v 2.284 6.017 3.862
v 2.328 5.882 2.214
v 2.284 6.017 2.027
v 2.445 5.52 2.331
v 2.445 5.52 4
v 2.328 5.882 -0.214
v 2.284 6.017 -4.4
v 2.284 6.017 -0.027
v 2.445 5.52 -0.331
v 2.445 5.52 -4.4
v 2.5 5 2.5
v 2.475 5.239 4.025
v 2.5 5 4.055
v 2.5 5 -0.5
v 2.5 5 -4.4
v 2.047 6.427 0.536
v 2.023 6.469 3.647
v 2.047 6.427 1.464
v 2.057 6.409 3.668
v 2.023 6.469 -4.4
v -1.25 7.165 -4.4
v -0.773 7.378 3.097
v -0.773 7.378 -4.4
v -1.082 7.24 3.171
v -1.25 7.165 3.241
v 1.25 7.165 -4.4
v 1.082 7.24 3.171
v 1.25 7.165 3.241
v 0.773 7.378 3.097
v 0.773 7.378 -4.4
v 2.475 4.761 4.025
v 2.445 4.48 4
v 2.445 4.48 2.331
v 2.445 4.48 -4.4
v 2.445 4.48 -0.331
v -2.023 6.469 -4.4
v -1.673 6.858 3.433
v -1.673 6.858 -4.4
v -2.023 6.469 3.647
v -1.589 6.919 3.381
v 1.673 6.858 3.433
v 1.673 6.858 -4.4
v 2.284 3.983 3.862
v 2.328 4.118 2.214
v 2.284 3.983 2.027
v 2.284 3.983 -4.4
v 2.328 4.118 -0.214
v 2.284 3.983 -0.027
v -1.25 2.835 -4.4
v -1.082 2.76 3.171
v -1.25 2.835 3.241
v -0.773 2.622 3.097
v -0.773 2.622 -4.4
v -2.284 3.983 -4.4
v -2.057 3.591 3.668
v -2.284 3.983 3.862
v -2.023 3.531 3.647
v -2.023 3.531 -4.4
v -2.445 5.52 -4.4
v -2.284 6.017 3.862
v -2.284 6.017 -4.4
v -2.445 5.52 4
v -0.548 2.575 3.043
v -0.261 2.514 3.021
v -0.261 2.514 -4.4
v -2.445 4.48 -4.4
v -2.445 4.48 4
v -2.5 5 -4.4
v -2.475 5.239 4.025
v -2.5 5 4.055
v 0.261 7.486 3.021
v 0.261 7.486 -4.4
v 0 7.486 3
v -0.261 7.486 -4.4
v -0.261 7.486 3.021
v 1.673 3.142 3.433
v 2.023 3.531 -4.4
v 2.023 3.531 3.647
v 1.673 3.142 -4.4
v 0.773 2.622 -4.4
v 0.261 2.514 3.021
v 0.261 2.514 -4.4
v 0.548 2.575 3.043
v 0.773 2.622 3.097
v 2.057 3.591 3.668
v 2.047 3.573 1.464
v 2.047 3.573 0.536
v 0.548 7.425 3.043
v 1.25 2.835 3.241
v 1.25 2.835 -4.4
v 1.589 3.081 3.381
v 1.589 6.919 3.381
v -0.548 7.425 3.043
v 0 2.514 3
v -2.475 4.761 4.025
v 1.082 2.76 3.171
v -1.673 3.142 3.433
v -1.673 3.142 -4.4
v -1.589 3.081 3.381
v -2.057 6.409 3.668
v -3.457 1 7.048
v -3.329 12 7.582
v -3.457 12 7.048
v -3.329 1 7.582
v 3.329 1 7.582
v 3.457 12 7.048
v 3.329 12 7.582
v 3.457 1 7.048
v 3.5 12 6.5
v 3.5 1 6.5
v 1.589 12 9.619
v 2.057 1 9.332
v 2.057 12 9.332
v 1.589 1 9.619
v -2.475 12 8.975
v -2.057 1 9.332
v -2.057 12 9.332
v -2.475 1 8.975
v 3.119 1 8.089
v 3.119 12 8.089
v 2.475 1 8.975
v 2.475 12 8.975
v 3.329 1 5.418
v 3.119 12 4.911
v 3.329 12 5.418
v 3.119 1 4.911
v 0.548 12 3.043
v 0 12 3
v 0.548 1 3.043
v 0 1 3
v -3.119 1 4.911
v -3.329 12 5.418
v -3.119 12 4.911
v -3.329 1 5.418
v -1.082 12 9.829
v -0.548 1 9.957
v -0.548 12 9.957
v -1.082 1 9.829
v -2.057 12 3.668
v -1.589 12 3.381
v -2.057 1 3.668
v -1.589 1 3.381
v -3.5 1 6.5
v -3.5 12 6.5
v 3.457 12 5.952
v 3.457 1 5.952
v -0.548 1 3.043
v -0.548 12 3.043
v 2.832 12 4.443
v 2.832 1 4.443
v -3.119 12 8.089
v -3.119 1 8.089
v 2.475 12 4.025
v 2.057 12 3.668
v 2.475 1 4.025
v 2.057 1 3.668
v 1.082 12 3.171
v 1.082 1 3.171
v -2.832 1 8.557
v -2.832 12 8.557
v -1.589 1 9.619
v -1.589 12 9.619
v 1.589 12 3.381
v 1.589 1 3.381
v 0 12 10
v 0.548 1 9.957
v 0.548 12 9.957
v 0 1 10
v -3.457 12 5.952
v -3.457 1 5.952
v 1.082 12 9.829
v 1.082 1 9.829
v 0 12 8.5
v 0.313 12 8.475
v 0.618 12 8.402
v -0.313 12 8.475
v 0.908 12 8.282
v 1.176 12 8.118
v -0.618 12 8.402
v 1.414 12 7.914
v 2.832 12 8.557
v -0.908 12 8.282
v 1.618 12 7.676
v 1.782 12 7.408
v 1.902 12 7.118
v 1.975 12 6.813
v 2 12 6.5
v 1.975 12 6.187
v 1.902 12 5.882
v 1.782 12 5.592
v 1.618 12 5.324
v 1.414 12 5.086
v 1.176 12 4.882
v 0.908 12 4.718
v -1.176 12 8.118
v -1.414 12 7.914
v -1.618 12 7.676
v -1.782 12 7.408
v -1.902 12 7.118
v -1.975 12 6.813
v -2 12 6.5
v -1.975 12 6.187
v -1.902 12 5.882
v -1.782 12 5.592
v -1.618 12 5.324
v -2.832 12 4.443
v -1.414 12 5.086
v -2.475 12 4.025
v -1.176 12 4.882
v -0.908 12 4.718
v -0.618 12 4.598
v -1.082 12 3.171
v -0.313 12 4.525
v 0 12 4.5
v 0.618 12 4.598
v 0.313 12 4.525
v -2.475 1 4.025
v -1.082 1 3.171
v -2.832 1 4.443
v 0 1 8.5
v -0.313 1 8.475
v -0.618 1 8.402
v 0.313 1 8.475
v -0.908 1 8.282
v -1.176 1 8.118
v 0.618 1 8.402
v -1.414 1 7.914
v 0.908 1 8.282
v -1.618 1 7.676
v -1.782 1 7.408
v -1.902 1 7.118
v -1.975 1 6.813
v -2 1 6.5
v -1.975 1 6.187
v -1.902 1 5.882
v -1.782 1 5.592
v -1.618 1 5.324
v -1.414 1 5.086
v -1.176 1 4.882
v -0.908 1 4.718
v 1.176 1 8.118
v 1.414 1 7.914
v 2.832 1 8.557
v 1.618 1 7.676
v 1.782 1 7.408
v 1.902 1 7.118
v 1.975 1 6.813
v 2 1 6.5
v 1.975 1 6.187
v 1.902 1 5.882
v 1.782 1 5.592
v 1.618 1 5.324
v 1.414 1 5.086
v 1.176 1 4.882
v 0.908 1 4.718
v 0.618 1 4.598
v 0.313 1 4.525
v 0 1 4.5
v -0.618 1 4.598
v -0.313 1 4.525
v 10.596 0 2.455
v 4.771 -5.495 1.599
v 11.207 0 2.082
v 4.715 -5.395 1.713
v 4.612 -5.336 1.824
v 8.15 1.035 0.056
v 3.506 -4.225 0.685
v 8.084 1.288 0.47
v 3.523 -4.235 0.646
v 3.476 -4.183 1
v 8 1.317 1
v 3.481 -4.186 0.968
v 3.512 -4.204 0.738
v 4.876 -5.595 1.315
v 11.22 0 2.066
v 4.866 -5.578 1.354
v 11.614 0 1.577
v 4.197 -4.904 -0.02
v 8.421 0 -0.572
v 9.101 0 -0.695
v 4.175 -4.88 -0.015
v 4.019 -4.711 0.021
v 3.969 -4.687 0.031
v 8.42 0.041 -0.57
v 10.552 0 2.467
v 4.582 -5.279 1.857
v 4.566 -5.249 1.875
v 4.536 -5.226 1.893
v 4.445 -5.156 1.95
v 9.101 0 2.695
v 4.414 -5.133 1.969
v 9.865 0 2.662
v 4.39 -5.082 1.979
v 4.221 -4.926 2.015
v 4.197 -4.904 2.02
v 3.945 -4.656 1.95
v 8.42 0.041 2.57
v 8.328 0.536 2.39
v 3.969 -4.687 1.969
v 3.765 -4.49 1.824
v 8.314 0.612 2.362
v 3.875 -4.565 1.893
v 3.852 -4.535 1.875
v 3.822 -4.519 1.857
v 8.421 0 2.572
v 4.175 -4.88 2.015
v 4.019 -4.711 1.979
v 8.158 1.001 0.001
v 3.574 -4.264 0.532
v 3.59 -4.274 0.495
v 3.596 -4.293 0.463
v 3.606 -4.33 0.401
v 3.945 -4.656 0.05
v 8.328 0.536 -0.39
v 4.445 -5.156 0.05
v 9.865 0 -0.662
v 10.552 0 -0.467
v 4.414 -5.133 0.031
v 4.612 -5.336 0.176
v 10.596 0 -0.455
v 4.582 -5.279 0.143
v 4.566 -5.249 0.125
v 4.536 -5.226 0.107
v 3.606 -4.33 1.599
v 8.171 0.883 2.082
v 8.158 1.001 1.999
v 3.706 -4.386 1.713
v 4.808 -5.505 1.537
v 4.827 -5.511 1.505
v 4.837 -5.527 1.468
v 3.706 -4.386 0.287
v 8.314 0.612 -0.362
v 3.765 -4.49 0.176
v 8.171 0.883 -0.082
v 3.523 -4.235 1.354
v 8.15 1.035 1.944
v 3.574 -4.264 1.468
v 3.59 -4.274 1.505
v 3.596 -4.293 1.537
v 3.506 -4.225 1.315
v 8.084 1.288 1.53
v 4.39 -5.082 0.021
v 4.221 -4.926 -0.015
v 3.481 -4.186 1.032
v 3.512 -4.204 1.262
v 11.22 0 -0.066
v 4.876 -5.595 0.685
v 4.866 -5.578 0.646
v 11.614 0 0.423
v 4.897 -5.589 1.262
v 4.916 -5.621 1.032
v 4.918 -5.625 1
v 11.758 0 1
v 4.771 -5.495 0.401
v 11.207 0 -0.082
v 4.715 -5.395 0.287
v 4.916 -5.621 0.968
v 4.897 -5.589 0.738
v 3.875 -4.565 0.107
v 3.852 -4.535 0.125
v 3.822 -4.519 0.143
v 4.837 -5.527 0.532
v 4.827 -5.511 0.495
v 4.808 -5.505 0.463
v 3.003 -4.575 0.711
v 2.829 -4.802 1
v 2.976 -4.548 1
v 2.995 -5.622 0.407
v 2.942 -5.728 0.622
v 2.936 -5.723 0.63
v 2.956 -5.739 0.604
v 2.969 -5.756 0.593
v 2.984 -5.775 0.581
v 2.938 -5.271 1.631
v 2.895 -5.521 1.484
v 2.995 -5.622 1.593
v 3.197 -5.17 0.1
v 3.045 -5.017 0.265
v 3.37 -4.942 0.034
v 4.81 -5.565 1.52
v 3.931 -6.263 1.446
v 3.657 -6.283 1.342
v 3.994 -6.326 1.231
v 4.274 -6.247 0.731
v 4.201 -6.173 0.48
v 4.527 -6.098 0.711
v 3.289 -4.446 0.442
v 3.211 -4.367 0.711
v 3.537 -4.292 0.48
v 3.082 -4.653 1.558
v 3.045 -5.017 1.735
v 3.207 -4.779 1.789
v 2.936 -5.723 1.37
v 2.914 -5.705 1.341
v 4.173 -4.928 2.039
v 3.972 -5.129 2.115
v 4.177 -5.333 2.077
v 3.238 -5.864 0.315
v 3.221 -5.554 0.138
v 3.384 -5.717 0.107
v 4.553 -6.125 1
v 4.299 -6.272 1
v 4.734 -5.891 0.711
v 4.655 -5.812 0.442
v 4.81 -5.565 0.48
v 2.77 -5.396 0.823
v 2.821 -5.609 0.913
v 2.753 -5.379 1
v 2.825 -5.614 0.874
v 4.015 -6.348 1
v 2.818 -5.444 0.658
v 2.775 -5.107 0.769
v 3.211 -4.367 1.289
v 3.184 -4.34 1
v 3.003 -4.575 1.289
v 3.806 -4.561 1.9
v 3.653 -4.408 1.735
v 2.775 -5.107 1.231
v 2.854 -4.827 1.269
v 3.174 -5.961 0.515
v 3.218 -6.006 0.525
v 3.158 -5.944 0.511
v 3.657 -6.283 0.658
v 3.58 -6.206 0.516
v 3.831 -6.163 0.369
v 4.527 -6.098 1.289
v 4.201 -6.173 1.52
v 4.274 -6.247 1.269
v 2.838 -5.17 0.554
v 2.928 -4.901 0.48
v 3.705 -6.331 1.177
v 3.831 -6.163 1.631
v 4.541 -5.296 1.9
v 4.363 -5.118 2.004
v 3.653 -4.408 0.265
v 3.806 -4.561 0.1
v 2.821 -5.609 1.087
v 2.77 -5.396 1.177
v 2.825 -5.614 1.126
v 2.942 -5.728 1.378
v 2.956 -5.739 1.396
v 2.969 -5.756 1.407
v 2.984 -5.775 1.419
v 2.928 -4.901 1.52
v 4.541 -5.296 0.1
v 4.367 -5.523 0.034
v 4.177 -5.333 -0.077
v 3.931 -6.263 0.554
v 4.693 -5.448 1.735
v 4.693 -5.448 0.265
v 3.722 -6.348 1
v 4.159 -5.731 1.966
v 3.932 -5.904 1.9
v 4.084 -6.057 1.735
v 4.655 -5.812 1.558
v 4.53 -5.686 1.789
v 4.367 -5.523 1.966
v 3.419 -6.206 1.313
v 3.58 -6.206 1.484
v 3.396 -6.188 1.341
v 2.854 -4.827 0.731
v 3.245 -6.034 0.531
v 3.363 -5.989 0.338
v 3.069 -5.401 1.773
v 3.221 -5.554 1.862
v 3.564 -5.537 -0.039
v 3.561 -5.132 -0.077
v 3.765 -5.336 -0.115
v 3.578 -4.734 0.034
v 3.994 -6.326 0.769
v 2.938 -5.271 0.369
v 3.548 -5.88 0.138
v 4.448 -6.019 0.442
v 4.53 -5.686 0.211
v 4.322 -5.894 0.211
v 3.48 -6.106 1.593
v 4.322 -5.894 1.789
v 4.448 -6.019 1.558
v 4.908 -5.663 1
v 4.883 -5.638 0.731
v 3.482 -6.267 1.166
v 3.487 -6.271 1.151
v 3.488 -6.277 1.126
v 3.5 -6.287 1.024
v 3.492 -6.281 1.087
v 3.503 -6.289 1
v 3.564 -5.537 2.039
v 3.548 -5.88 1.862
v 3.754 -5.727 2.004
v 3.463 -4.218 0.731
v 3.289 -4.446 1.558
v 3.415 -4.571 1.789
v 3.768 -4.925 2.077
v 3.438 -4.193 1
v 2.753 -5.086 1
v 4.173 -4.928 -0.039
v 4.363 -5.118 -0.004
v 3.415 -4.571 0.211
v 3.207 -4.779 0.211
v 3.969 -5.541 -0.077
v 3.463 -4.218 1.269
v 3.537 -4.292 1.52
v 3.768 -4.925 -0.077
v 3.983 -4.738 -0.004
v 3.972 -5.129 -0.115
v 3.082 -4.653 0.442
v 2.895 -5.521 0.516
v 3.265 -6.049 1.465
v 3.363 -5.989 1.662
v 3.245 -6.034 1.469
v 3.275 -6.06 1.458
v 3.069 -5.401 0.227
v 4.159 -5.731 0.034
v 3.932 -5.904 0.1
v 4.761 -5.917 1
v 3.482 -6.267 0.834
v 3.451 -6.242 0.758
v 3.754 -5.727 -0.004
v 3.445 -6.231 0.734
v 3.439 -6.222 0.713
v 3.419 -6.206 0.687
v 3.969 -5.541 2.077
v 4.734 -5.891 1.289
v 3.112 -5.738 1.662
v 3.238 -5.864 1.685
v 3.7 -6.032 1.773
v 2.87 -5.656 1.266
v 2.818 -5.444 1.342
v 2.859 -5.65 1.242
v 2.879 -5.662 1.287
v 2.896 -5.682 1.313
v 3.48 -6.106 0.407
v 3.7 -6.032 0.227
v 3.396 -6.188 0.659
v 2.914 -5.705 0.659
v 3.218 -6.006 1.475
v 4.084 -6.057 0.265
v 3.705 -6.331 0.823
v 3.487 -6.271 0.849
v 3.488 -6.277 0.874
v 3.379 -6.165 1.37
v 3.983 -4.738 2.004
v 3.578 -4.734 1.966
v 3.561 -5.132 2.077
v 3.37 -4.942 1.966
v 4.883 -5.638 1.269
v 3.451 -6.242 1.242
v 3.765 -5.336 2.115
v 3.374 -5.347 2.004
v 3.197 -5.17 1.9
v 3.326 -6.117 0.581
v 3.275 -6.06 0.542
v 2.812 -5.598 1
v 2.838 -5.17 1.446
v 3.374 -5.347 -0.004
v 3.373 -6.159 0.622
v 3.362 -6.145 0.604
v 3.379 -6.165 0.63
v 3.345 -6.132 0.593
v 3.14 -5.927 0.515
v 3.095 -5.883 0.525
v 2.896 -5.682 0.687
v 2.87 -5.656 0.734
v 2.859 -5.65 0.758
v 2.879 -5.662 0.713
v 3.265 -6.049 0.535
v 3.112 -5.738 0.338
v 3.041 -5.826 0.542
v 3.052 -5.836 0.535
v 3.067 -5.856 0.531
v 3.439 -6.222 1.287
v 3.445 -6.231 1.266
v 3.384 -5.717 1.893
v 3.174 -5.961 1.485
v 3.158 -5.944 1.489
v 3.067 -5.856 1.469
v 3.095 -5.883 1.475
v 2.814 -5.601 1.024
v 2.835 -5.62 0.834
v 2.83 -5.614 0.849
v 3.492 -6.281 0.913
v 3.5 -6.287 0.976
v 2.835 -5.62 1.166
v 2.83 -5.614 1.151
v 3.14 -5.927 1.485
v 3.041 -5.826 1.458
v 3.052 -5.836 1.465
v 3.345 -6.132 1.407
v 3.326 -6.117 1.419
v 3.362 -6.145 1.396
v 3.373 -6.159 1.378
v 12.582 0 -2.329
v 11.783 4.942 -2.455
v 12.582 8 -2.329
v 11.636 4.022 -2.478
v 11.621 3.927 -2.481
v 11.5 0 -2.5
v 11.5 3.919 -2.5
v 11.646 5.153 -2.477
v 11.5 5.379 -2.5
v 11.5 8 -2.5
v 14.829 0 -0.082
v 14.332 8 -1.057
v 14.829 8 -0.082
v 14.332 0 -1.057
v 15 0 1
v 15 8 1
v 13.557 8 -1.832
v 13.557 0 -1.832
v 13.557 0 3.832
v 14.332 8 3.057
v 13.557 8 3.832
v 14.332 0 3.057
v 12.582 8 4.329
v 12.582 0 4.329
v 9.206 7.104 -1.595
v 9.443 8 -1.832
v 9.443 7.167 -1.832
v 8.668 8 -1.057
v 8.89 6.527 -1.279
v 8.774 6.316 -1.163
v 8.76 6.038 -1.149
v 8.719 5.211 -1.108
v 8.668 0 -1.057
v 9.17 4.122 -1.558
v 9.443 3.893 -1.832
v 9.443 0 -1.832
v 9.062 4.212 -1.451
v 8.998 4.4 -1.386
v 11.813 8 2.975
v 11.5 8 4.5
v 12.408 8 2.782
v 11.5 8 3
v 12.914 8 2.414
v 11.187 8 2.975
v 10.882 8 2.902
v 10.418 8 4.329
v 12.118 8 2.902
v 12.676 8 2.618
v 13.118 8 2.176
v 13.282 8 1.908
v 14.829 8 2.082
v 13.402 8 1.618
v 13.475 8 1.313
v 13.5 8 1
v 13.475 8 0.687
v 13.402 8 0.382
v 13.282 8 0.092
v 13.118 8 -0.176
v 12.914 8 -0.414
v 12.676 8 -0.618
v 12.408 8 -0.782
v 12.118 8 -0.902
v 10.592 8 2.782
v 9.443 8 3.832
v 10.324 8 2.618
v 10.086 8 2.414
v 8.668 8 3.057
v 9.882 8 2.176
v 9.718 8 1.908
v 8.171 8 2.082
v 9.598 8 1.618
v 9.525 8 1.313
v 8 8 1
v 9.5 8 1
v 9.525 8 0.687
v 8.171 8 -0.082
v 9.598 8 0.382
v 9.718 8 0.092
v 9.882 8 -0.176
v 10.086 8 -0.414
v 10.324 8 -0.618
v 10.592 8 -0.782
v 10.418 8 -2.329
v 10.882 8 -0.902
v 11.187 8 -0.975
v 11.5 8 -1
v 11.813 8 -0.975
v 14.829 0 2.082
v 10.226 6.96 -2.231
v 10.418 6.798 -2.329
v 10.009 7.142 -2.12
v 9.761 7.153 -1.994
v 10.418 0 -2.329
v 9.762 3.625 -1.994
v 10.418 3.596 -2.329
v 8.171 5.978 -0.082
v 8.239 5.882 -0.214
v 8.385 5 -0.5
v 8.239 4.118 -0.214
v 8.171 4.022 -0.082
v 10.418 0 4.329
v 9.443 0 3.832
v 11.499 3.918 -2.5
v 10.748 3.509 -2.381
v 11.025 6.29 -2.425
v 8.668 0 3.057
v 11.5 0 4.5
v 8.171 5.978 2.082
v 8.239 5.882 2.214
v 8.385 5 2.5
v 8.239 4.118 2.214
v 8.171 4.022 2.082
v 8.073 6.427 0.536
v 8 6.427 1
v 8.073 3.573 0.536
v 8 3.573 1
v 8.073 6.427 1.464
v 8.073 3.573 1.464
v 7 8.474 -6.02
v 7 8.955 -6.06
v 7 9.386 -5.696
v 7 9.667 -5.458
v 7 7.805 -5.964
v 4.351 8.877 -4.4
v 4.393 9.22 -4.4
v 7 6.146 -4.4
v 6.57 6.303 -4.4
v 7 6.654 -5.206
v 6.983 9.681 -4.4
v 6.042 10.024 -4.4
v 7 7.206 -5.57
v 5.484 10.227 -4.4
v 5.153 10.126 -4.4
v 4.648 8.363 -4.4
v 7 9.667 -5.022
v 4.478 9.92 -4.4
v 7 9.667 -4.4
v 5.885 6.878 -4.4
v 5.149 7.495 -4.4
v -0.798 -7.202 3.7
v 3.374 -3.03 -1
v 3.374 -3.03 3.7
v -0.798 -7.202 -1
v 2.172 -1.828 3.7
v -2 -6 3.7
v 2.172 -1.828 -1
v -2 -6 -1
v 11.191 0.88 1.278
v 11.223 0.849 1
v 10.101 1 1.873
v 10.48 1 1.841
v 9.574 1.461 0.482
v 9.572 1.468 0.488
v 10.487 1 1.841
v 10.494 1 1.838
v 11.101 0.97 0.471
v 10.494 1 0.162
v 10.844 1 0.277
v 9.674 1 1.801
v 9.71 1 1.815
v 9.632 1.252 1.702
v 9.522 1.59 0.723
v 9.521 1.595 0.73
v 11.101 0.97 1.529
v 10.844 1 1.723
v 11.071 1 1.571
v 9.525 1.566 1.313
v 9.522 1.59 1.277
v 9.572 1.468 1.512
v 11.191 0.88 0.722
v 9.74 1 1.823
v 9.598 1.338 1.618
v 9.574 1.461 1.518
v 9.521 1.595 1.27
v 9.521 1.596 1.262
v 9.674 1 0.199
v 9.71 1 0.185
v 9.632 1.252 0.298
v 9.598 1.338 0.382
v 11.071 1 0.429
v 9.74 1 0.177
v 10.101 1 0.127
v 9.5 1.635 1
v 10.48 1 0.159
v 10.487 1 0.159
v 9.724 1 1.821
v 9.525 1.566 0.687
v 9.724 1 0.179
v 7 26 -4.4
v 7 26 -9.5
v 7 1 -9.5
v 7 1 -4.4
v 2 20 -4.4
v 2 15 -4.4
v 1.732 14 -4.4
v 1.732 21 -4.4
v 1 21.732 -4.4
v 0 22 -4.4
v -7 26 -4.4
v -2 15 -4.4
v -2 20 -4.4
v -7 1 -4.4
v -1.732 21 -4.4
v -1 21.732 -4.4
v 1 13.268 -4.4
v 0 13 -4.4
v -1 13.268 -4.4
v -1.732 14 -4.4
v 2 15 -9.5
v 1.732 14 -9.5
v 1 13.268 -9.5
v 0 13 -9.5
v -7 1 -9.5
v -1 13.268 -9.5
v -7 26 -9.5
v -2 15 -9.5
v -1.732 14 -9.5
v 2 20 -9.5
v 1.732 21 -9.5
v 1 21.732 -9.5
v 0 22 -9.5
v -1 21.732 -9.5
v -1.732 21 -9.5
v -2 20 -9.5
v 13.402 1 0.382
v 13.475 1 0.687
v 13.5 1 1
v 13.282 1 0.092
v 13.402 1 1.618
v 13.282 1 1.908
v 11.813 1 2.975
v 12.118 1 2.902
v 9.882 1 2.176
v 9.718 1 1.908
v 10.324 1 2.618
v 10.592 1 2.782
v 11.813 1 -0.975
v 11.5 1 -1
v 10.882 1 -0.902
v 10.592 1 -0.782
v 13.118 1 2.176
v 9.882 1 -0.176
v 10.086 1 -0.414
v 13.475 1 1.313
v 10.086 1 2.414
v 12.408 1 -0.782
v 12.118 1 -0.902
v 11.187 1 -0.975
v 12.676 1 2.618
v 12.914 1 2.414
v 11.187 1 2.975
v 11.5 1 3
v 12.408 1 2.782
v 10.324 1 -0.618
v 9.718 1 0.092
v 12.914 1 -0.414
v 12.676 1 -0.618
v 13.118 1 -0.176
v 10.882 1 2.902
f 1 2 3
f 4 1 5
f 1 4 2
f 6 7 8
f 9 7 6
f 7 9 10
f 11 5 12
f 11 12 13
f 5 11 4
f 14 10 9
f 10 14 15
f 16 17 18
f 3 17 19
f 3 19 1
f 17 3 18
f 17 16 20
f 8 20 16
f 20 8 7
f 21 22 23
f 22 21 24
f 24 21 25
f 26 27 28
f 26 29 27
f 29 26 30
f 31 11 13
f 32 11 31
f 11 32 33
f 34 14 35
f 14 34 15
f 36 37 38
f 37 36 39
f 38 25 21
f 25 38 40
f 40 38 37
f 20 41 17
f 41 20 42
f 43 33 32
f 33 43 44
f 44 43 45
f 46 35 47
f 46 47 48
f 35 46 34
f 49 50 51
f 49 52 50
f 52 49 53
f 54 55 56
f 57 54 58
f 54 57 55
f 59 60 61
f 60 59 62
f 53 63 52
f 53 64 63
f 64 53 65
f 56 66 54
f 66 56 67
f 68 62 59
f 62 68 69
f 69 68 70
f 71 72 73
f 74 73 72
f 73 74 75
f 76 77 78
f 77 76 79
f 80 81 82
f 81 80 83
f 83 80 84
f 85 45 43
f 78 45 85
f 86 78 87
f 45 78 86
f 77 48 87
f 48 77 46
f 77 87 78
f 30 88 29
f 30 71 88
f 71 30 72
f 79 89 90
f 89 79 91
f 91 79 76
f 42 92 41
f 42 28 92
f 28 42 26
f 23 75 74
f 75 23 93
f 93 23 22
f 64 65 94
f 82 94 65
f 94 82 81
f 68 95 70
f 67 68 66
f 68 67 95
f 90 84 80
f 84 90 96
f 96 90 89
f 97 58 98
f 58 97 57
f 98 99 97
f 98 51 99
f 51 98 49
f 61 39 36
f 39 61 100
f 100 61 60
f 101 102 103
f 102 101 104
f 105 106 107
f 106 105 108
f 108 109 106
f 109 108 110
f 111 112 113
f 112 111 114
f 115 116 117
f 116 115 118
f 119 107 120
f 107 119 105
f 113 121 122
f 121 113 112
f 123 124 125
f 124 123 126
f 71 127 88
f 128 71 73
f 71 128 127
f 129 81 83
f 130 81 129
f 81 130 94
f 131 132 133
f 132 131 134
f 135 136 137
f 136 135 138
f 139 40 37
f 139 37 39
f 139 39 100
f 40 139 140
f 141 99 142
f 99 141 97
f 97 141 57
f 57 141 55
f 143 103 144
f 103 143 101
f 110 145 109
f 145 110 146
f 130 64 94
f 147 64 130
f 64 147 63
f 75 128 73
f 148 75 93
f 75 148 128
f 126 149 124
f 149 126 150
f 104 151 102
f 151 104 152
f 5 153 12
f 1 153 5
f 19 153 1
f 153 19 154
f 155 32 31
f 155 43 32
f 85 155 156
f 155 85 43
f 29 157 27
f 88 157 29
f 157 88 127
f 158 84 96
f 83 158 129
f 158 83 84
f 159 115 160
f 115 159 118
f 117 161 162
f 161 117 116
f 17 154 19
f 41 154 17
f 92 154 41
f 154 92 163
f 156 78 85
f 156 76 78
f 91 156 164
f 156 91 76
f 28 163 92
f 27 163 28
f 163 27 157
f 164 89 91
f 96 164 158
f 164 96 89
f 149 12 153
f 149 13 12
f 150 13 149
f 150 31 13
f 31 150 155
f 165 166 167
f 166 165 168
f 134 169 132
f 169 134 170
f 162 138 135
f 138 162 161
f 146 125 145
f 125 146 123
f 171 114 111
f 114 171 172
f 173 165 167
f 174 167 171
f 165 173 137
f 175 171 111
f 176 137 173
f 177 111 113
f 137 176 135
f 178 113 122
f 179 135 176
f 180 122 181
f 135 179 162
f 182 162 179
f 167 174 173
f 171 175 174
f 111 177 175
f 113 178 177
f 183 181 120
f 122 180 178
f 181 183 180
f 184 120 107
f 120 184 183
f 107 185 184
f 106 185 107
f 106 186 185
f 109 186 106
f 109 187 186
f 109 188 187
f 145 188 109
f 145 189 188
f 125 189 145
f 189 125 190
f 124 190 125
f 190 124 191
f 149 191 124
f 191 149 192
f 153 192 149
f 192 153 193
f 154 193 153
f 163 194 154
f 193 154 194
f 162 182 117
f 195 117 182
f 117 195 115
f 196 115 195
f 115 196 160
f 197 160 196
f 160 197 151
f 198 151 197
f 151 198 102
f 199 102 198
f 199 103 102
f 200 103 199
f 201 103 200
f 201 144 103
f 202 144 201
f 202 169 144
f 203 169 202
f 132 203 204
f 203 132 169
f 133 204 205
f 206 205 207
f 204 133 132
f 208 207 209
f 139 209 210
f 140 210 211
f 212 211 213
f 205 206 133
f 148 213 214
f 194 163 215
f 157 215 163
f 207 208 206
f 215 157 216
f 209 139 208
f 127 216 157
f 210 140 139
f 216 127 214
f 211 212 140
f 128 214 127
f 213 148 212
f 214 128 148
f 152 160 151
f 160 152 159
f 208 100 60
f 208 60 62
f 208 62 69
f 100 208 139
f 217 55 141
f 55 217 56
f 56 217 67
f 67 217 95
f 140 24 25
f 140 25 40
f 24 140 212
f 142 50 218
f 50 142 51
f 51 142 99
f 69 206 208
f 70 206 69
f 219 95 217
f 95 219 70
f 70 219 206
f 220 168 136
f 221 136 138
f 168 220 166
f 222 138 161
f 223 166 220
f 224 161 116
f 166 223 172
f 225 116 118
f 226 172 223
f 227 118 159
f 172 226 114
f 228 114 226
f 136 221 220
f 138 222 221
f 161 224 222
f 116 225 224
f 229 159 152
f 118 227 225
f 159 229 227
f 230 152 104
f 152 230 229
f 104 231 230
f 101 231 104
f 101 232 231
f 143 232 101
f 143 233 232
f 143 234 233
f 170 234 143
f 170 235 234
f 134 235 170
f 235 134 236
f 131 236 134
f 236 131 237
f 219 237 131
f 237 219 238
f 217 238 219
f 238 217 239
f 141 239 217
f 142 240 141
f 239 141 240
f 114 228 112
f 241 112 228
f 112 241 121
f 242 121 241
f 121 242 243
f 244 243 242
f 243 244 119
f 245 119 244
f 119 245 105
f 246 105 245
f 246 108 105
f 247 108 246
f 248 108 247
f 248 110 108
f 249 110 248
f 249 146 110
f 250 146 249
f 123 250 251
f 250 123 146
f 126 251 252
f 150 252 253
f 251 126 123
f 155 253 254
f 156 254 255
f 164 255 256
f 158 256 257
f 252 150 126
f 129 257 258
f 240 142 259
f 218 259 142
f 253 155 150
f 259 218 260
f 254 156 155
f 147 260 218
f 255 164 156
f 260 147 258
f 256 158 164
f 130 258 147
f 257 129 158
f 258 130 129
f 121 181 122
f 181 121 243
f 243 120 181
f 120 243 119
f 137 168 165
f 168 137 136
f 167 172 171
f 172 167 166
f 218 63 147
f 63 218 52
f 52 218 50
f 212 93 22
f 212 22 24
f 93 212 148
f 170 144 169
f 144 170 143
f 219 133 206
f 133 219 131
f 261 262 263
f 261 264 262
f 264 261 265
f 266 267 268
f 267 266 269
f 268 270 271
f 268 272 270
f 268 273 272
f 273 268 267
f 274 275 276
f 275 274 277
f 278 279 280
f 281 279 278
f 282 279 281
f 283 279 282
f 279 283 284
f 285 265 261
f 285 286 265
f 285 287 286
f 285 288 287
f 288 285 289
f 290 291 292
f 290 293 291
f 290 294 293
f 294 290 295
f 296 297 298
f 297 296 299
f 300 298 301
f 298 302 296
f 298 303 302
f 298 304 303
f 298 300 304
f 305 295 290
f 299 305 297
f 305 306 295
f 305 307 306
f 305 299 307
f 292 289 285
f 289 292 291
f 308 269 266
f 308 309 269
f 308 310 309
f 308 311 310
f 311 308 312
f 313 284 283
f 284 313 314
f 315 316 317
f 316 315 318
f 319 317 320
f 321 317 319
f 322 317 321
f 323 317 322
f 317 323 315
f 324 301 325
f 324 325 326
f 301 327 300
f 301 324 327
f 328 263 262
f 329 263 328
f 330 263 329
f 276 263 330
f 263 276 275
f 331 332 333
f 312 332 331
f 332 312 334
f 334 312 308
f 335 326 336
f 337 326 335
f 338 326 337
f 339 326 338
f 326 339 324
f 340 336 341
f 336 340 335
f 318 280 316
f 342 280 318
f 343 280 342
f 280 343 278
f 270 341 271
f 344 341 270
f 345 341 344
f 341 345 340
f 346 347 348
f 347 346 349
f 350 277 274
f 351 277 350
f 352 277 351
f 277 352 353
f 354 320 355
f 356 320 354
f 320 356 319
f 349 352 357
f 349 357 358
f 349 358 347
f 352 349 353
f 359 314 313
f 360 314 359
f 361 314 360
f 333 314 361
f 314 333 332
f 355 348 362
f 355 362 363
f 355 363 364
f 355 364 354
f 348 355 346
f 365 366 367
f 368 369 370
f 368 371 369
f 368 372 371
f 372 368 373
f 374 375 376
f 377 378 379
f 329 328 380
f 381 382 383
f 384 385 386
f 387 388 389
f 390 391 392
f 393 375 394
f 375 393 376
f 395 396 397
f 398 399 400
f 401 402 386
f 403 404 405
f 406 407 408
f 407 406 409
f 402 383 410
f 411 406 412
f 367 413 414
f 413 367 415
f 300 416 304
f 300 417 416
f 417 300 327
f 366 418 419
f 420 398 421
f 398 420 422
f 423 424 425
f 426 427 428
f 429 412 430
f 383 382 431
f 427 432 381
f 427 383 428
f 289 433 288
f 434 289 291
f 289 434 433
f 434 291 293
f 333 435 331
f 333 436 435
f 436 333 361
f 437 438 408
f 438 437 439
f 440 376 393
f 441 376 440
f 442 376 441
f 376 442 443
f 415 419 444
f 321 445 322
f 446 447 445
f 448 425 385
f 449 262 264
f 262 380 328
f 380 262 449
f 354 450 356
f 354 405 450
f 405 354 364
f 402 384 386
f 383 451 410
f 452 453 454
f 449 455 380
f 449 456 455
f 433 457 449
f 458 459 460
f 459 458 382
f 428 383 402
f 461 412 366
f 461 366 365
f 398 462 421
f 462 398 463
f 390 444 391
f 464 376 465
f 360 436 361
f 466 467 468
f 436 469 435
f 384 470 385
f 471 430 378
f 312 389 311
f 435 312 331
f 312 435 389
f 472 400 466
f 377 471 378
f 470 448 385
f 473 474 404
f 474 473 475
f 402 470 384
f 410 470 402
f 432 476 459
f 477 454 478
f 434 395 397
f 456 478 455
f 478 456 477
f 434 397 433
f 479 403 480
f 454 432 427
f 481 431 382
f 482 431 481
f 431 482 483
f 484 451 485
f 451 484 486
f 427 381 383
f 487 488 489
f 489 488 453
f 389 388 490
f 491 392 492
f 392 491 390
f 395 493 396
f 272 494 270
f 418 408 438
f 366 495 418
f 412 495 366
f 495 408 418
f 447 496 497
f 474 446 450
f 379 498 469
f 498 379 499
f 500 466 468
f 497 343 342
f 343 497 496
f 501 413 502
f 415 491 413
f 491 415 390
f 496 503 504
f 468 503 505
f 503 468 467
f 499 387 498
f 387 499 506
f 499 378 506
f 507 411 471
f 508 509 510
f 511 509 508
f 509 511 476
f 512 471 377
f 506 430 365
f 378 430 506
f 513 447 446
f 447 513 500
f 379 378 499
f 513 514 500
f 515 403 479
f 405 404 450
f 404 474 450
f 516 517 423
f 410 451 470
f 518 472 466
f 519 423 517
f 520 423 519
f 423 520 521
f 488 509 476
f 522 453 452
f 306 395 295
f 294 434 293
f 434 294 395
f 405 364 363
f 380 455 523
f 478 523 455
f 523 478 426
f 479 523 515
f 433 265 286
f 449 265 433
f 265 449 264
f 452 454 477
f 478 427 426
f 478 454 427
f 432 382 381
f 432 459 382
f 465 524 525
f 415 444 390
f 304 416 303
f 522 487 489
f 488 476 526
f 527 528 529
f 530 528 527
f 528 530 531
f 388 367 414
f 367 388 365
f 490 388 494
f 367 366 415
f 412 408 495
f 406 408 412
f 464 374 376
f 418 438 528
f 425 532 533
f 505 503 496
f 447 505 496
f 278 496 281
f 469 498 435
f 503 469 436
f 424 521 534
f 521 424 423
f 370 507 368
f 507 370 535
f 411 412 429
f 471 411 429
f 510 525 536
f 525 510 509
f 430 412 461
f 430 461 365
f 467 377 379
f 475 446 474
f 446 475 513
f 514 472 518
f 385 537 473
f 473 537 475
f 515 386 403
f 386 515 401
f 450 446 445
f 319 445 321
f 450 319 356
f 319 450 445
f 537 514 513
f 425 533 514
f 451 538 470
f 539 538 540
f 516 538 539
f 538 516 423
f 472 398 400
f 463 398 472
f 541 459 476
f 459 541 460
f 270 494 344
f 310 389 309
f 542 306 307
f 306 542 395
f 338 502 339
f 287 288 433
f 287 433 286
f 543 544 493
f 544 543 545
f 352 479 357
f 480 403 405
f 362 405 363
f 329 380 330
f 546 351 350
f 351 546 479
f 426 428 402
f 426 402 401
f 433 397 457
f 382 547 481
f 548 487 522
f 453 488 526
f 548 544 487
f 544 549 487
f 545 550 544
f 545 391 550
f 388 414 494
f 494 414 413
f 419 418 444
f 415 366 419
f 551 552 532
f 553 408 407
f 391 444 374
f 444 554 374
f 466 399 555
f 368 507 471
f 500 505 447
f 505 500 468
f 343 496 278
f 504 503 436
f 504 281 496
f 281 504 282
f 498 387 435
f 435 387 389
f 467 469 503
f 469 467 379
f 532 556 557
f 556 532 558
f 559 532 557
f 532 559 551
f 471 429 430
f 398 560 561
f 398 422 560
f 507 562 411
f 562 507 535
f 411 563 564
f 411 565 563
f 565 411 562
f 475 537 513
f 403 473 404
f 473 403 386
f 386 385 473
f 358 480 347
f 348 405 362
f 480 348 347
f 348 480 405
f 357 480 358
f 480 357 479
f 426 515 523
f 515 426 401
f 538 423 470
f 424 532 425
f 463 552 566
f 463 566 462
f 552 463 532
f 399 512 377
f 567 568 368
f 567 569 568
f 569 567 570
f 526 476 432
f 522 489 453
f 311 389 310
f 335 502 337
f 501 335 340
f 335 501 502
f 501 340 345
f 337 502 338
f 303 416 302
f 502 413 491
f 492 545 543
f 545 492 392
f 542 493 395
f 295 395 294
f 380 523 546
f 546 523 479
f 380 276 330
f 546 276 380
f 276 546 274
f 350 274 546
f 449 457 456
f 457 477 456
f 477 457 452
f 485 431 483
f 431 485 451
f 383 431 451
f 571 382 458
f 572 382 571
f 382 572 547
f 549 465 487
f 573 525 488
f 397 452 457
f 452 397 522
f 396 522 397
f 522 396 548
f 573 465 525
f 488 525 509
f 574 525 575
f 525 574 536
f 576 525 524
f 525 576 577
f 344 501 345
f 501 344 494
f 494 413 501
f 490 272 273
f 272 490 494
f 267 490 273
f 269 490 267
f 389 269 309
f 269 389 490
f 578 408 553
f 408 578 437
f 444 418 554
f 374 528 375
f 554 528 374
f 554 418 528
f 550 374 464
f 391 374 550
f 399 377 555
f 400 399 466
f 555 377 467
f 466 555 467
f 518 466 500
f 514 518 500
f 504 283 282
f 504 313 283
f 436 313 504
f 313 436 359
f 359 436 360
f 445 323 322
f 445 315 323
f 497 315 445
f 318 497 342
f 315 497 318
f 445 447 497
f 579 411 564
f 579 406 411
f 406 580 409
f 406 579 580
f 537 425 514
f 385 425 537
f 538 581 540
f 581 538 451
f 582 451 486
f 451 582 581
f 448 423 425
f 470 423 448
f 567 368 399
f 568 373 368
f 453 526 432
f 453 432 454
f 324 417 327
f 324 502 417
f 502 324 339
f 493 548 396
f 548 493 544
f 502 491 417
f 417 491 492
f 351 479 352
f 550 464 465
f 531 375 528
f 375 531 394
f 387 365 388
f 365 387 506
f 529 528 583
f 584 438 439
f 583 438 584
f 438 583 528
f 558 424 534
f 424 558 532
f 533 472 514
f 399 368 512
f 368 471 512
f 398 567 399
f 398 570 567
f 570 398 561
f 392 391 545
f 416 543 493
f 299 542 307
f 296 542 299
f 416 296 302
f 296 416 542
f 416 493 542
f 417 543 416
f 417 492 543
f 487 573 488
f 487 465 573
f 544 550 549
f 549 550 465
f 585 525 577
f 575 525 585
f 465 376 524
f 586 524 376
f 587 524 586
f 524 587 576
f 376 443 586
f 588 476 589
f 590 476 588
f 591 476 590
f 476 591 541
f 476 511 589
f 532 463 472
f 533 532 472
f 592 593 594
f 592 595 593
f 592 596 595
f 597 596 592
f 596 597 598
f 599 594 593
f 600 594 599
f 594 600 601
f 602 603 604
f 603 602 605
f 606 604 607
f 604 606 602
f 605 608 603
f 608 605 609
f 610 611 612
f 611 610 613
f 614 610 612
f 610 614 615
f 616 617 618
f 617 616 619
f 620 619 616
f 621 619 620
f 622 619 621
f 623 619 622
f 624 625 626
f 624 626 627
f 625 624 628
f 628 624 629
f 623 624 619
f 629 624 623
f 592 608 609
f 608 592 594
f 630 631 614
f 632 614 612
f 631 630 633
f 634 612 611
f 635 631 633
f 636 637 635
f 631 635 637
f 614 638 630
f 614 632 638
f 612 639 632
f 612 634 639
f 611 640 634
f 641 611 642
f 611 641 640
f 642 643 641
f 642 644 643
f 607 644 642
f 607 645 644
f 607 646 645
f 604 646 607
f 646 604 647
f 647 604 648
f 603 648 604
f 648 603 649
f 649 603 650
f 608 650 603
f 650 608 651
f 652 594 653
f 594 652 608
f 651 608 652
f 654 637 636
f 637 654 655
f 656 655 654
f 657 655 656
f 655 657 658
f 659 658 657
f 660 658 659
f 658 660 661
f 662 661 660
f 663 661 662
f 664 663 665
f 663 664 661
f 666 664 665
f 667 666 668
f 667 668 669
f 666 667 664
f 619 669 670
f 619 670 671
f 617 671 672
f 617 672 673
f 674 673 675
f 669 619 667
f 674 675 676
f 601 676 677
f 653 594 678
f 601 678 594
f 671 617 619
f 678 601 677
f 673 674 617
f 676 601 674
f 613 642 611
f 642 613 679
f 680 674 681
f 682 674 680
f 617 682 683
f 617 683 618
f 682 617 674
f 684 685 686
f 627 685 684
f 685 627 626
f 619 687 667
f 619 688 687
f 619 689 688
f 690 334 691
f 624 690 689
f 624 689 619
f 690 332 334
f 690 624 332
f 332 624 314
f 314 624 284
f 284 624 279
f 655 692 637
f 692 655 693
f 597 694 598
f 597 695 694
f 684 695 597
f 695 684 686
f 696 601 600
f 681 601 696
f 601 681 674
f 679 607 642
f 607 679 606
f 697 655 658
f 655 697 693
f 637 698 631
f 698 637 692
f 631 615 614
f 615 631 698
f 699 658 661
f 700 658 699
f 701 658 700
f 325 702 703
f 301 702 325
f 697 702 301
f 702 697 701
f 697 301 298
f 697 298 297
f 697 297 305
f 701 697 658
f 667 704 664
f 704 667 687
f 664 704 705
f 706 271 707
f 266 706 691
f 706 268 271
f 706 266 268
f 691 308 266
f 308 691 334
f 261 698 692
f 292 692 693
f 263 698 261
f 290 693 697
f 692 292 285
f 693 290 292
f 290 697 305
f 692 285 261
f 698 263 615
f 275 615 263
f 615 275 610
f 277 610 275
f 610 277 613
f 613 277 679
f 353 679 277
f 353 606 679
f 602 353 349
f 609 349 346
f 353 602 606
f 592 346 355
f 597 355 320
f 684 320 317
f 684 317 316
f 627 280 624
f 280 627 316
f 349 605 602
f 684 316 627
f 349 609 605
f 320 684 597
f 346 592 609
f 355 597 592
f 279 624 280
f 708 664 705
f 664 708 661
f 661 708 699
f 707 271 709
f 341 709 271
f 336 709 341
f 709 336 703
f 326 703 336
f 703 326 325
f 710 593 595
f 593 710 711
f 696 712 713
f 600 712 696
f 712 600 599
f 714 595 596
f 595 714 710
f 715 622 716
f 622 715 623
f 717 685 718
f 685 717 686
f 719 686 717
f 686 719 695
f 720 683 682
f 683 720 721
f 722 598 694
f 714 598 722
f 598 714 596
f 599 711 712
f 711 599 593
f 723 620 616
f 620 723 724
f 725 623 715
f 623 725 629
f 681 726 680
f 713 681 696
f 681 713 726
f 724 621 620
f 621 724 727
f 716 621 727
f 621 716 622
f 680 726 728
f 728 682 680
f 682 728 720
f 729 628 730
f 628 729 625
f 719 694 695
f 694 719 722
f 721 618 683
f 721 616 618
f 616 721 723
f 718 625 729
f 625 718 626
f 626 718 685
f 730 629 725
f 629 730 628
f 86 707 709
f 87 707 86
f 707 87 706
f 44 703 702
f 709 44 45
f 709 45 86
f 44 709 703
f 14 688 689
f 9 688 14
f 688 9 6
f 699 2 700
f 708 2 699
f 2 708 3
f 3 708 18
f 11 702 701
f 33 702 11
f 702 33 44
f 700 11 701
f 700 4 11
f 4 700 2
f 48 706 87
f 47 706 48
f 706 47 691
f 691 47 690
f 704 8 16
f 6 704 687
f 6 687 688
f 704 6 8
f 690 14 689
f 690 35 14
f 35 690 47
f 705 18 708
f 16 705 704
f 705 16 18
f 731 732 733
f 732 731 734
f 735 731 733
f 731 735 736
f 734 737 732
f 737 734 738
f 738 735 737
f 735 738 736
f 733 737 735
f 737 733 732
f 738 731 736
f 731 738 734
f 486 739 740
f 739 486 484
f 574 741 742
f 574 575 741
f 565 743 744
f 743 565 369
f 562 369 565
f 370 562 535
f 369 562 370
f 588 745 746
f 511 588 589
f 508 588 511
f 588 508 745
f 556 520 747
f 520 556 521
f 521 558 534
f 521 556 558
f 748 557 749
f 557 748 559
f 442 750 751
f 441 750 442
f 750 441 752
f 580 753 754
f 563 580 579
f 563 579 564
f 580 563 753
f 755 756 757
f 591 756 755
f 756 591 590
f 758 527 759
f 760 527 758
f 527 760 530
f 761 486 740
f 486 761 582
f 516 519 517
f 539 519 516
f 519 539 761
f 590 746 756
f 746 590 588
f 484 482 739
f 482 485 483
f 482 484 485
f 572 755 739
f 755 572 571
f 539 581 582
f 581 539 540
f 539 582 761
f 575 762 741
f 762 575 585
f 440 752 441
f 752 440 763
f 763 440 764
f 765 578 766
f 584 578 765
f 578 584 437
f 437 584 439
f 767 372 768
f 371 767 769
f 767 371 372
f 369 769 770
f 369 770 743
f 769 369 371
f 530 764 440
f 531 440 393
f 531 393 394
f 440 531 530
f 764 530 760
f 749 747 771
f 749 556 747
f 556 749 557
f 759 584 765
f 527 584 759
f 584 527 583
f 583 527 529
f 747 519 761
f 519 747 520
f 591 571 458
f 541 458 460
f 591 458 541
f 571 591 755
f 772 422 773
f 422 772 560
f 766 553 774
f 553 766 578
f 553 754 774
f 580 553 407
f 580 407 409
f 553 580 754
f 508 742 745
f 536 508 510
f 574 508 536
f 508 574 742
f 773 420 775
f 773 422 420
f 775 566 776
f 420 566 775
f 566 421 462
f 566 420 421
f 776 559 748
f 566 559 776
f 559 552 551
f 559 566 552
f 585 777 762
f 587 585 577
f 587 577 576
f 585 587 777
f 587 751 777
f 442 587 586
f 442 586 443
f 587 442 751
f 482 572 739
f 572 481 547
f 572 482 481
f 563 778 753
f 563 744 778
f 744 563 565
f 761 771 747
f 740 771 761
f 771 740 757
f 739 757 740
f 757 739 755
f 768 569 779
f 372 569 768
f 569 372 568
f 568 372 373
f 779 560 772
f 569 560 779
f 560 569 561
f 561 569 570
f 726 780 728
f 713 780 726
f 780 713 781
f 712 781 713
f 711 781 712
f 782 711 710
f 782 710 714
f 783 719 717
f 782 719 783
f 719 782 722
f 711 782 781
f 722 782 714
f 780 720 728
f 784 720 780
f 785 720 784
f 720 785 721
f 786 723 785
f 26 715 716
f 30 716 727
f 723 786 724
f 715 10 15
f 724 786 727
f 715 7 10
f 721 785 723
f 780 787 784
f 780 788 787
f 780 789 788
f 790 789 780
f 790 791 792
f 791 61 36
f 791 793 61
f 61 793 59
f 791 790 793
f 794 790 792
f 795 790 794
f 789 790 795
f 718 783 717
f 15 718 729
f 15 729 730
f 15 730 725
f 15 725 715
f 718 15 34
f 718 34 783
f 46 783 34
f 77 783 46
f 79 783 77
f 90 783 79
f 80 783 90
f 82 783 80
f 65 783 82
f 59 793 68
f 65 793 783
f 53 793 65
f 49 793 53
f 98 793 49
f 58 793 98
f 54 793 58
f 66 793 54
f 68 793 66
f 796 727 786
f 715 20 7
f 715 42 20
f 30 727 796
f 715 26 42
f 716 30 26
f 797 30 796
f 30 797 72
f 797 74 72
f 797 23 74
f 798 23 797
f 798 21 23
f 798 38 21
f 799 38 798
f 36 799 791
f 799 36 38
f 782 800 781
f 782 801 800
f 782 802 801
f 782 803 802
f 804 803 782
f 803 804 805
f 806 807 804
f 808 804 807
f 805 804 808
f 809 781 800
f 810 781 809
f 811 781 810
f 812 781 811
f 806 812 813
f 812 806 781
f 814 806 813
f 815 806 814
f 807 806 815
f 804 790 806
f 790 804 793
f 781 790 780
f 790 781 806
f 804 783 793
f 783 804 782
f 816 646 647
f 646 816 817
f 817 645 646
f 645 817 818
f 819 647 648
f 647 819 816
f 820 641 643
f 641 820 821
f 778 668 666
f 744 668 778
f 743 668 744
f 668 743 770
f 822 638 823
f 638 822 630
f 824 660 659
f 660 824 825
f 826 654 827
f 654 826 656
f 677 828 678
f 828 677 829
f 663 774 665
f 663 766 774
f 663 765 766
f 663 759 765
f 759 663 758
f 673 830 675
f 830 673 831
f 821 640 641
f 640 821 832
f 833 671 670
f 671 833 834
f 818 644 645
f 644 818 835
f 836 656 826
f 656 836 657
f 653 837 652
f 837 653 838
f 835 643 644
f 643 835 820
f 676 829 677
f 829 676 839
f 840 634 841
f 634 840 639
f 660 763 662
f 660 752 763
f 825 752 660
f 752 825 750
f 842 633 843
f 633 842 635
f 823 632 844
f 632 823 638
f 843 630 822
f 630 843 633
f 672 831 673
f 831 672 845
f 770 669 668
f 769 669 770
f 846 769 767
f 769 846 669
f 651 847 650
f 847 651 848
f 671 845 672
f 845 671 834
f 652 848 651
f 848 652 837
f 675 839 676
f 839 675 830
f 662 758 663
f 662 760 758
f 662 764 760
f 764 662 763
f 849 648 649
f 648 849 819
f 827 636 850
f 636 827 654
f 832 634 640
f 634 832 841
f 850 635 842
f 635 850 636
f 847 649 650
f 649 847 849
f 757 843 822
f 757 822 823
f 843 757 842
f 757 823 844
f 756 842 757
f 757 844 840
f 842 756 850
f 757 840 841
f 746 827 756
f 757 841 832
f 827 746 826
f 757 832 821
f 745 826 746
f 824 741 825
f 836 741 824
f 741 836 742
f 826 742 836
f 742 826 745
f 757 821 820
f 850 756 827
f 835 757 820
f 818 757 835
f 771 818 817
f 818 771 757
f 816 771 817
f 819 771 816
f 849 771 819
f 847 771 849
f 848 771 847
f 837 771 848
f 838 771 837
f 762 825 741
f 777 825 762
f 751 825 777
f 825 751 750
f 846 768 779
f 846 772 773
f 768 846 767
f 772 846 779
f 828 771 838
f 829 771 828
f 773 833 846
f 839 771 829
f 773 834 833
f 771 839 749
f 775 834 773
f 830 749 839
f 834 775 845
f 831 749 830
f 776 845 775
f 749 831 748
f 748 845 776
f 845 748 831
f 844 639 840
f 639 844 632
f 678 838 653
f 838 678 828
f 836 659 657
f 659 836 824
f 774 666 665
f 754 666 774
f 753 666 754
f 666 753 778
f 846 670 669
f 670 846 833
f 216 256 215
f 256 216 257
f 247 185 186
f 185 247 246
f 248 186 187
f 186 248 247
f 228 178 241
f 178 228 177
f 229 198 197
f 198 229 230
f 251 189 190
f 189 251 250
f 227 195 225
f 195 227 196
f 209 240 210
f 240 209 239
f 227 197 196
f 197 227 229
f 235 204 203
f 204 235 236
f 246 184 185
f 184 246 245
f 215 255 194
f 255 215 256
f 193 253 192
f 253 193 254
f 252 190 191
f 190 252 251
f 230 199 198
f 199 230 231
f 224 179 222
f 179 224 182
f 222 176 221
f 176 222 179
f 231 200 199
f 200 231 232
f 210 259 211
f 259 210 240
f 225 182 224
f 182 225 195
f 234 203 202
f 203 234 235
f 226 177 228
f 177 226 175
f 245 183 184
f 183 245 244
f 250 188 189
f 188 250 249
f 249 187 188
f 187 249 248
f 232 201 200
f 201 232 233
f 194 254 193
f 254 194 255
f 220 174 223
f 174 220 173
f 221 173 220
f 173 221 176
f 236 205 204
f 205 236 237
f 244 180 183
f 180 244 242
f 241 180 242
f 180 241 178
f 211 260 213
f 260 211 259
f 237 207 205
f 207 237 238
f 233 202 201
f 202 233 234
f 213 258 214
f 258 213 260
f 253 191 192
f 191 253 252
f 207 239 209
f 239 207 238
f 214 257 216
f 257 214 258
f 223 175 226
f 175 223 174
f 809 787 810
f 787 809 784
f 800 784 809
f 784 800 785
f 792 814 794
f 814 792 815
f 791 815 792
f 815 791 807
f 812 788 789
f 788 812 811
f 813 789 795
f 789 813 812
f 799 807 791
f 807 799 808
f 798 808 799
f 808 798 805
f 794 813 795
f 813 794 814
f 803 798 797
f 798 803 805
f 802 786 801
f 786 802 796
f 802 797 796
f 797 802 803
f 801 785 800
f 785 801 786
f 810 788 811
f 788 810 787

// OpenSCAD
module beam() {
    waterPort=[2.9,1,-5];
    
    module oneside() {
        difference() {
            union() {
                //water tubes
                tubeLen=9.75;
                translate([5,0,0])
                rotate([90,0,-45]) {
                    // color([0,1,1])
                    translate(waterPort) {
                        cylinder(d1=3.8,d2=1.9,h=tubeLen, $fn=20);
                        translate([0,0,tubeLen-0.25]) {
                            sphere(d=2.25,$fn=24);
                        }
                    }
                }

                //water tube out
                translate([11.5,0,1])
                rotate([-90,0,0])
                cylinder(h=8,d=7,$fn=20);

                //water tube scaffold
                color("yellow")
                translate([2,12,-8])
                rotate([0,60,-40])
                cylinder(h=15,d=3,$fn=10);

                //local ir holder

                
                color("Indigo")
                translate([0,5,1])
                rotate([0,90,0])
                cylinder(h=10,d=3,$fn=10);
                
                color("blue")
                translate([-2,-6,-1])
                rotate([0,0,-45])
                cube([1.7,5.9,4.7]);


            }

             
            #translate([5,0,0])
            rotate([90,0,-45])
            translate(waterPort)
            cylinder(d1=1.8,d2=0.9,h=11.5, $fn=20);

        }
    }

for (mm=[0])
    mirror([mm,0,0])
    oneside();

}

module scaffoldHull() {
        cylinder(d=5,h=15,$fn=30);
        //odor tube out
        rotate([90,0,0]) {
            translate([0,15,-7])
            cylinder(h=11,d=7,$fn=40);
        }
}





difference() {
    union() {
        translate([0,5,-8.5])
        //central column etc
        scaffoldHull();
        beam();
        //feet
        color("brown")
        translate([ -7, 1, -9.5 ]) { cube([ 14, 25, 5.1 ]); }
        
        
    }
    //odor remove
    rotate([90,0,0])
    translate([0,6.5,-16])
    cylinder(h=50,d=4,$fn=40);
    
    
    //water tube out remove
    for(xx=[11.5,-11.5])
            translate([xx,1,1])
            rotate([-90,0,0])
            // translate([0,0,2])
            cylinder(h=10,d=4,$fn=40);
    
    
      // Leg hole
  hull()
  {
    translate([ 0, 15, -10 ]) cylinder(d = 4, h = 15, $fn = 12);
    translate([ 0, 20, -10 ]) cylinder(d = 4, h = 15, $fn = 12);
  }

}
